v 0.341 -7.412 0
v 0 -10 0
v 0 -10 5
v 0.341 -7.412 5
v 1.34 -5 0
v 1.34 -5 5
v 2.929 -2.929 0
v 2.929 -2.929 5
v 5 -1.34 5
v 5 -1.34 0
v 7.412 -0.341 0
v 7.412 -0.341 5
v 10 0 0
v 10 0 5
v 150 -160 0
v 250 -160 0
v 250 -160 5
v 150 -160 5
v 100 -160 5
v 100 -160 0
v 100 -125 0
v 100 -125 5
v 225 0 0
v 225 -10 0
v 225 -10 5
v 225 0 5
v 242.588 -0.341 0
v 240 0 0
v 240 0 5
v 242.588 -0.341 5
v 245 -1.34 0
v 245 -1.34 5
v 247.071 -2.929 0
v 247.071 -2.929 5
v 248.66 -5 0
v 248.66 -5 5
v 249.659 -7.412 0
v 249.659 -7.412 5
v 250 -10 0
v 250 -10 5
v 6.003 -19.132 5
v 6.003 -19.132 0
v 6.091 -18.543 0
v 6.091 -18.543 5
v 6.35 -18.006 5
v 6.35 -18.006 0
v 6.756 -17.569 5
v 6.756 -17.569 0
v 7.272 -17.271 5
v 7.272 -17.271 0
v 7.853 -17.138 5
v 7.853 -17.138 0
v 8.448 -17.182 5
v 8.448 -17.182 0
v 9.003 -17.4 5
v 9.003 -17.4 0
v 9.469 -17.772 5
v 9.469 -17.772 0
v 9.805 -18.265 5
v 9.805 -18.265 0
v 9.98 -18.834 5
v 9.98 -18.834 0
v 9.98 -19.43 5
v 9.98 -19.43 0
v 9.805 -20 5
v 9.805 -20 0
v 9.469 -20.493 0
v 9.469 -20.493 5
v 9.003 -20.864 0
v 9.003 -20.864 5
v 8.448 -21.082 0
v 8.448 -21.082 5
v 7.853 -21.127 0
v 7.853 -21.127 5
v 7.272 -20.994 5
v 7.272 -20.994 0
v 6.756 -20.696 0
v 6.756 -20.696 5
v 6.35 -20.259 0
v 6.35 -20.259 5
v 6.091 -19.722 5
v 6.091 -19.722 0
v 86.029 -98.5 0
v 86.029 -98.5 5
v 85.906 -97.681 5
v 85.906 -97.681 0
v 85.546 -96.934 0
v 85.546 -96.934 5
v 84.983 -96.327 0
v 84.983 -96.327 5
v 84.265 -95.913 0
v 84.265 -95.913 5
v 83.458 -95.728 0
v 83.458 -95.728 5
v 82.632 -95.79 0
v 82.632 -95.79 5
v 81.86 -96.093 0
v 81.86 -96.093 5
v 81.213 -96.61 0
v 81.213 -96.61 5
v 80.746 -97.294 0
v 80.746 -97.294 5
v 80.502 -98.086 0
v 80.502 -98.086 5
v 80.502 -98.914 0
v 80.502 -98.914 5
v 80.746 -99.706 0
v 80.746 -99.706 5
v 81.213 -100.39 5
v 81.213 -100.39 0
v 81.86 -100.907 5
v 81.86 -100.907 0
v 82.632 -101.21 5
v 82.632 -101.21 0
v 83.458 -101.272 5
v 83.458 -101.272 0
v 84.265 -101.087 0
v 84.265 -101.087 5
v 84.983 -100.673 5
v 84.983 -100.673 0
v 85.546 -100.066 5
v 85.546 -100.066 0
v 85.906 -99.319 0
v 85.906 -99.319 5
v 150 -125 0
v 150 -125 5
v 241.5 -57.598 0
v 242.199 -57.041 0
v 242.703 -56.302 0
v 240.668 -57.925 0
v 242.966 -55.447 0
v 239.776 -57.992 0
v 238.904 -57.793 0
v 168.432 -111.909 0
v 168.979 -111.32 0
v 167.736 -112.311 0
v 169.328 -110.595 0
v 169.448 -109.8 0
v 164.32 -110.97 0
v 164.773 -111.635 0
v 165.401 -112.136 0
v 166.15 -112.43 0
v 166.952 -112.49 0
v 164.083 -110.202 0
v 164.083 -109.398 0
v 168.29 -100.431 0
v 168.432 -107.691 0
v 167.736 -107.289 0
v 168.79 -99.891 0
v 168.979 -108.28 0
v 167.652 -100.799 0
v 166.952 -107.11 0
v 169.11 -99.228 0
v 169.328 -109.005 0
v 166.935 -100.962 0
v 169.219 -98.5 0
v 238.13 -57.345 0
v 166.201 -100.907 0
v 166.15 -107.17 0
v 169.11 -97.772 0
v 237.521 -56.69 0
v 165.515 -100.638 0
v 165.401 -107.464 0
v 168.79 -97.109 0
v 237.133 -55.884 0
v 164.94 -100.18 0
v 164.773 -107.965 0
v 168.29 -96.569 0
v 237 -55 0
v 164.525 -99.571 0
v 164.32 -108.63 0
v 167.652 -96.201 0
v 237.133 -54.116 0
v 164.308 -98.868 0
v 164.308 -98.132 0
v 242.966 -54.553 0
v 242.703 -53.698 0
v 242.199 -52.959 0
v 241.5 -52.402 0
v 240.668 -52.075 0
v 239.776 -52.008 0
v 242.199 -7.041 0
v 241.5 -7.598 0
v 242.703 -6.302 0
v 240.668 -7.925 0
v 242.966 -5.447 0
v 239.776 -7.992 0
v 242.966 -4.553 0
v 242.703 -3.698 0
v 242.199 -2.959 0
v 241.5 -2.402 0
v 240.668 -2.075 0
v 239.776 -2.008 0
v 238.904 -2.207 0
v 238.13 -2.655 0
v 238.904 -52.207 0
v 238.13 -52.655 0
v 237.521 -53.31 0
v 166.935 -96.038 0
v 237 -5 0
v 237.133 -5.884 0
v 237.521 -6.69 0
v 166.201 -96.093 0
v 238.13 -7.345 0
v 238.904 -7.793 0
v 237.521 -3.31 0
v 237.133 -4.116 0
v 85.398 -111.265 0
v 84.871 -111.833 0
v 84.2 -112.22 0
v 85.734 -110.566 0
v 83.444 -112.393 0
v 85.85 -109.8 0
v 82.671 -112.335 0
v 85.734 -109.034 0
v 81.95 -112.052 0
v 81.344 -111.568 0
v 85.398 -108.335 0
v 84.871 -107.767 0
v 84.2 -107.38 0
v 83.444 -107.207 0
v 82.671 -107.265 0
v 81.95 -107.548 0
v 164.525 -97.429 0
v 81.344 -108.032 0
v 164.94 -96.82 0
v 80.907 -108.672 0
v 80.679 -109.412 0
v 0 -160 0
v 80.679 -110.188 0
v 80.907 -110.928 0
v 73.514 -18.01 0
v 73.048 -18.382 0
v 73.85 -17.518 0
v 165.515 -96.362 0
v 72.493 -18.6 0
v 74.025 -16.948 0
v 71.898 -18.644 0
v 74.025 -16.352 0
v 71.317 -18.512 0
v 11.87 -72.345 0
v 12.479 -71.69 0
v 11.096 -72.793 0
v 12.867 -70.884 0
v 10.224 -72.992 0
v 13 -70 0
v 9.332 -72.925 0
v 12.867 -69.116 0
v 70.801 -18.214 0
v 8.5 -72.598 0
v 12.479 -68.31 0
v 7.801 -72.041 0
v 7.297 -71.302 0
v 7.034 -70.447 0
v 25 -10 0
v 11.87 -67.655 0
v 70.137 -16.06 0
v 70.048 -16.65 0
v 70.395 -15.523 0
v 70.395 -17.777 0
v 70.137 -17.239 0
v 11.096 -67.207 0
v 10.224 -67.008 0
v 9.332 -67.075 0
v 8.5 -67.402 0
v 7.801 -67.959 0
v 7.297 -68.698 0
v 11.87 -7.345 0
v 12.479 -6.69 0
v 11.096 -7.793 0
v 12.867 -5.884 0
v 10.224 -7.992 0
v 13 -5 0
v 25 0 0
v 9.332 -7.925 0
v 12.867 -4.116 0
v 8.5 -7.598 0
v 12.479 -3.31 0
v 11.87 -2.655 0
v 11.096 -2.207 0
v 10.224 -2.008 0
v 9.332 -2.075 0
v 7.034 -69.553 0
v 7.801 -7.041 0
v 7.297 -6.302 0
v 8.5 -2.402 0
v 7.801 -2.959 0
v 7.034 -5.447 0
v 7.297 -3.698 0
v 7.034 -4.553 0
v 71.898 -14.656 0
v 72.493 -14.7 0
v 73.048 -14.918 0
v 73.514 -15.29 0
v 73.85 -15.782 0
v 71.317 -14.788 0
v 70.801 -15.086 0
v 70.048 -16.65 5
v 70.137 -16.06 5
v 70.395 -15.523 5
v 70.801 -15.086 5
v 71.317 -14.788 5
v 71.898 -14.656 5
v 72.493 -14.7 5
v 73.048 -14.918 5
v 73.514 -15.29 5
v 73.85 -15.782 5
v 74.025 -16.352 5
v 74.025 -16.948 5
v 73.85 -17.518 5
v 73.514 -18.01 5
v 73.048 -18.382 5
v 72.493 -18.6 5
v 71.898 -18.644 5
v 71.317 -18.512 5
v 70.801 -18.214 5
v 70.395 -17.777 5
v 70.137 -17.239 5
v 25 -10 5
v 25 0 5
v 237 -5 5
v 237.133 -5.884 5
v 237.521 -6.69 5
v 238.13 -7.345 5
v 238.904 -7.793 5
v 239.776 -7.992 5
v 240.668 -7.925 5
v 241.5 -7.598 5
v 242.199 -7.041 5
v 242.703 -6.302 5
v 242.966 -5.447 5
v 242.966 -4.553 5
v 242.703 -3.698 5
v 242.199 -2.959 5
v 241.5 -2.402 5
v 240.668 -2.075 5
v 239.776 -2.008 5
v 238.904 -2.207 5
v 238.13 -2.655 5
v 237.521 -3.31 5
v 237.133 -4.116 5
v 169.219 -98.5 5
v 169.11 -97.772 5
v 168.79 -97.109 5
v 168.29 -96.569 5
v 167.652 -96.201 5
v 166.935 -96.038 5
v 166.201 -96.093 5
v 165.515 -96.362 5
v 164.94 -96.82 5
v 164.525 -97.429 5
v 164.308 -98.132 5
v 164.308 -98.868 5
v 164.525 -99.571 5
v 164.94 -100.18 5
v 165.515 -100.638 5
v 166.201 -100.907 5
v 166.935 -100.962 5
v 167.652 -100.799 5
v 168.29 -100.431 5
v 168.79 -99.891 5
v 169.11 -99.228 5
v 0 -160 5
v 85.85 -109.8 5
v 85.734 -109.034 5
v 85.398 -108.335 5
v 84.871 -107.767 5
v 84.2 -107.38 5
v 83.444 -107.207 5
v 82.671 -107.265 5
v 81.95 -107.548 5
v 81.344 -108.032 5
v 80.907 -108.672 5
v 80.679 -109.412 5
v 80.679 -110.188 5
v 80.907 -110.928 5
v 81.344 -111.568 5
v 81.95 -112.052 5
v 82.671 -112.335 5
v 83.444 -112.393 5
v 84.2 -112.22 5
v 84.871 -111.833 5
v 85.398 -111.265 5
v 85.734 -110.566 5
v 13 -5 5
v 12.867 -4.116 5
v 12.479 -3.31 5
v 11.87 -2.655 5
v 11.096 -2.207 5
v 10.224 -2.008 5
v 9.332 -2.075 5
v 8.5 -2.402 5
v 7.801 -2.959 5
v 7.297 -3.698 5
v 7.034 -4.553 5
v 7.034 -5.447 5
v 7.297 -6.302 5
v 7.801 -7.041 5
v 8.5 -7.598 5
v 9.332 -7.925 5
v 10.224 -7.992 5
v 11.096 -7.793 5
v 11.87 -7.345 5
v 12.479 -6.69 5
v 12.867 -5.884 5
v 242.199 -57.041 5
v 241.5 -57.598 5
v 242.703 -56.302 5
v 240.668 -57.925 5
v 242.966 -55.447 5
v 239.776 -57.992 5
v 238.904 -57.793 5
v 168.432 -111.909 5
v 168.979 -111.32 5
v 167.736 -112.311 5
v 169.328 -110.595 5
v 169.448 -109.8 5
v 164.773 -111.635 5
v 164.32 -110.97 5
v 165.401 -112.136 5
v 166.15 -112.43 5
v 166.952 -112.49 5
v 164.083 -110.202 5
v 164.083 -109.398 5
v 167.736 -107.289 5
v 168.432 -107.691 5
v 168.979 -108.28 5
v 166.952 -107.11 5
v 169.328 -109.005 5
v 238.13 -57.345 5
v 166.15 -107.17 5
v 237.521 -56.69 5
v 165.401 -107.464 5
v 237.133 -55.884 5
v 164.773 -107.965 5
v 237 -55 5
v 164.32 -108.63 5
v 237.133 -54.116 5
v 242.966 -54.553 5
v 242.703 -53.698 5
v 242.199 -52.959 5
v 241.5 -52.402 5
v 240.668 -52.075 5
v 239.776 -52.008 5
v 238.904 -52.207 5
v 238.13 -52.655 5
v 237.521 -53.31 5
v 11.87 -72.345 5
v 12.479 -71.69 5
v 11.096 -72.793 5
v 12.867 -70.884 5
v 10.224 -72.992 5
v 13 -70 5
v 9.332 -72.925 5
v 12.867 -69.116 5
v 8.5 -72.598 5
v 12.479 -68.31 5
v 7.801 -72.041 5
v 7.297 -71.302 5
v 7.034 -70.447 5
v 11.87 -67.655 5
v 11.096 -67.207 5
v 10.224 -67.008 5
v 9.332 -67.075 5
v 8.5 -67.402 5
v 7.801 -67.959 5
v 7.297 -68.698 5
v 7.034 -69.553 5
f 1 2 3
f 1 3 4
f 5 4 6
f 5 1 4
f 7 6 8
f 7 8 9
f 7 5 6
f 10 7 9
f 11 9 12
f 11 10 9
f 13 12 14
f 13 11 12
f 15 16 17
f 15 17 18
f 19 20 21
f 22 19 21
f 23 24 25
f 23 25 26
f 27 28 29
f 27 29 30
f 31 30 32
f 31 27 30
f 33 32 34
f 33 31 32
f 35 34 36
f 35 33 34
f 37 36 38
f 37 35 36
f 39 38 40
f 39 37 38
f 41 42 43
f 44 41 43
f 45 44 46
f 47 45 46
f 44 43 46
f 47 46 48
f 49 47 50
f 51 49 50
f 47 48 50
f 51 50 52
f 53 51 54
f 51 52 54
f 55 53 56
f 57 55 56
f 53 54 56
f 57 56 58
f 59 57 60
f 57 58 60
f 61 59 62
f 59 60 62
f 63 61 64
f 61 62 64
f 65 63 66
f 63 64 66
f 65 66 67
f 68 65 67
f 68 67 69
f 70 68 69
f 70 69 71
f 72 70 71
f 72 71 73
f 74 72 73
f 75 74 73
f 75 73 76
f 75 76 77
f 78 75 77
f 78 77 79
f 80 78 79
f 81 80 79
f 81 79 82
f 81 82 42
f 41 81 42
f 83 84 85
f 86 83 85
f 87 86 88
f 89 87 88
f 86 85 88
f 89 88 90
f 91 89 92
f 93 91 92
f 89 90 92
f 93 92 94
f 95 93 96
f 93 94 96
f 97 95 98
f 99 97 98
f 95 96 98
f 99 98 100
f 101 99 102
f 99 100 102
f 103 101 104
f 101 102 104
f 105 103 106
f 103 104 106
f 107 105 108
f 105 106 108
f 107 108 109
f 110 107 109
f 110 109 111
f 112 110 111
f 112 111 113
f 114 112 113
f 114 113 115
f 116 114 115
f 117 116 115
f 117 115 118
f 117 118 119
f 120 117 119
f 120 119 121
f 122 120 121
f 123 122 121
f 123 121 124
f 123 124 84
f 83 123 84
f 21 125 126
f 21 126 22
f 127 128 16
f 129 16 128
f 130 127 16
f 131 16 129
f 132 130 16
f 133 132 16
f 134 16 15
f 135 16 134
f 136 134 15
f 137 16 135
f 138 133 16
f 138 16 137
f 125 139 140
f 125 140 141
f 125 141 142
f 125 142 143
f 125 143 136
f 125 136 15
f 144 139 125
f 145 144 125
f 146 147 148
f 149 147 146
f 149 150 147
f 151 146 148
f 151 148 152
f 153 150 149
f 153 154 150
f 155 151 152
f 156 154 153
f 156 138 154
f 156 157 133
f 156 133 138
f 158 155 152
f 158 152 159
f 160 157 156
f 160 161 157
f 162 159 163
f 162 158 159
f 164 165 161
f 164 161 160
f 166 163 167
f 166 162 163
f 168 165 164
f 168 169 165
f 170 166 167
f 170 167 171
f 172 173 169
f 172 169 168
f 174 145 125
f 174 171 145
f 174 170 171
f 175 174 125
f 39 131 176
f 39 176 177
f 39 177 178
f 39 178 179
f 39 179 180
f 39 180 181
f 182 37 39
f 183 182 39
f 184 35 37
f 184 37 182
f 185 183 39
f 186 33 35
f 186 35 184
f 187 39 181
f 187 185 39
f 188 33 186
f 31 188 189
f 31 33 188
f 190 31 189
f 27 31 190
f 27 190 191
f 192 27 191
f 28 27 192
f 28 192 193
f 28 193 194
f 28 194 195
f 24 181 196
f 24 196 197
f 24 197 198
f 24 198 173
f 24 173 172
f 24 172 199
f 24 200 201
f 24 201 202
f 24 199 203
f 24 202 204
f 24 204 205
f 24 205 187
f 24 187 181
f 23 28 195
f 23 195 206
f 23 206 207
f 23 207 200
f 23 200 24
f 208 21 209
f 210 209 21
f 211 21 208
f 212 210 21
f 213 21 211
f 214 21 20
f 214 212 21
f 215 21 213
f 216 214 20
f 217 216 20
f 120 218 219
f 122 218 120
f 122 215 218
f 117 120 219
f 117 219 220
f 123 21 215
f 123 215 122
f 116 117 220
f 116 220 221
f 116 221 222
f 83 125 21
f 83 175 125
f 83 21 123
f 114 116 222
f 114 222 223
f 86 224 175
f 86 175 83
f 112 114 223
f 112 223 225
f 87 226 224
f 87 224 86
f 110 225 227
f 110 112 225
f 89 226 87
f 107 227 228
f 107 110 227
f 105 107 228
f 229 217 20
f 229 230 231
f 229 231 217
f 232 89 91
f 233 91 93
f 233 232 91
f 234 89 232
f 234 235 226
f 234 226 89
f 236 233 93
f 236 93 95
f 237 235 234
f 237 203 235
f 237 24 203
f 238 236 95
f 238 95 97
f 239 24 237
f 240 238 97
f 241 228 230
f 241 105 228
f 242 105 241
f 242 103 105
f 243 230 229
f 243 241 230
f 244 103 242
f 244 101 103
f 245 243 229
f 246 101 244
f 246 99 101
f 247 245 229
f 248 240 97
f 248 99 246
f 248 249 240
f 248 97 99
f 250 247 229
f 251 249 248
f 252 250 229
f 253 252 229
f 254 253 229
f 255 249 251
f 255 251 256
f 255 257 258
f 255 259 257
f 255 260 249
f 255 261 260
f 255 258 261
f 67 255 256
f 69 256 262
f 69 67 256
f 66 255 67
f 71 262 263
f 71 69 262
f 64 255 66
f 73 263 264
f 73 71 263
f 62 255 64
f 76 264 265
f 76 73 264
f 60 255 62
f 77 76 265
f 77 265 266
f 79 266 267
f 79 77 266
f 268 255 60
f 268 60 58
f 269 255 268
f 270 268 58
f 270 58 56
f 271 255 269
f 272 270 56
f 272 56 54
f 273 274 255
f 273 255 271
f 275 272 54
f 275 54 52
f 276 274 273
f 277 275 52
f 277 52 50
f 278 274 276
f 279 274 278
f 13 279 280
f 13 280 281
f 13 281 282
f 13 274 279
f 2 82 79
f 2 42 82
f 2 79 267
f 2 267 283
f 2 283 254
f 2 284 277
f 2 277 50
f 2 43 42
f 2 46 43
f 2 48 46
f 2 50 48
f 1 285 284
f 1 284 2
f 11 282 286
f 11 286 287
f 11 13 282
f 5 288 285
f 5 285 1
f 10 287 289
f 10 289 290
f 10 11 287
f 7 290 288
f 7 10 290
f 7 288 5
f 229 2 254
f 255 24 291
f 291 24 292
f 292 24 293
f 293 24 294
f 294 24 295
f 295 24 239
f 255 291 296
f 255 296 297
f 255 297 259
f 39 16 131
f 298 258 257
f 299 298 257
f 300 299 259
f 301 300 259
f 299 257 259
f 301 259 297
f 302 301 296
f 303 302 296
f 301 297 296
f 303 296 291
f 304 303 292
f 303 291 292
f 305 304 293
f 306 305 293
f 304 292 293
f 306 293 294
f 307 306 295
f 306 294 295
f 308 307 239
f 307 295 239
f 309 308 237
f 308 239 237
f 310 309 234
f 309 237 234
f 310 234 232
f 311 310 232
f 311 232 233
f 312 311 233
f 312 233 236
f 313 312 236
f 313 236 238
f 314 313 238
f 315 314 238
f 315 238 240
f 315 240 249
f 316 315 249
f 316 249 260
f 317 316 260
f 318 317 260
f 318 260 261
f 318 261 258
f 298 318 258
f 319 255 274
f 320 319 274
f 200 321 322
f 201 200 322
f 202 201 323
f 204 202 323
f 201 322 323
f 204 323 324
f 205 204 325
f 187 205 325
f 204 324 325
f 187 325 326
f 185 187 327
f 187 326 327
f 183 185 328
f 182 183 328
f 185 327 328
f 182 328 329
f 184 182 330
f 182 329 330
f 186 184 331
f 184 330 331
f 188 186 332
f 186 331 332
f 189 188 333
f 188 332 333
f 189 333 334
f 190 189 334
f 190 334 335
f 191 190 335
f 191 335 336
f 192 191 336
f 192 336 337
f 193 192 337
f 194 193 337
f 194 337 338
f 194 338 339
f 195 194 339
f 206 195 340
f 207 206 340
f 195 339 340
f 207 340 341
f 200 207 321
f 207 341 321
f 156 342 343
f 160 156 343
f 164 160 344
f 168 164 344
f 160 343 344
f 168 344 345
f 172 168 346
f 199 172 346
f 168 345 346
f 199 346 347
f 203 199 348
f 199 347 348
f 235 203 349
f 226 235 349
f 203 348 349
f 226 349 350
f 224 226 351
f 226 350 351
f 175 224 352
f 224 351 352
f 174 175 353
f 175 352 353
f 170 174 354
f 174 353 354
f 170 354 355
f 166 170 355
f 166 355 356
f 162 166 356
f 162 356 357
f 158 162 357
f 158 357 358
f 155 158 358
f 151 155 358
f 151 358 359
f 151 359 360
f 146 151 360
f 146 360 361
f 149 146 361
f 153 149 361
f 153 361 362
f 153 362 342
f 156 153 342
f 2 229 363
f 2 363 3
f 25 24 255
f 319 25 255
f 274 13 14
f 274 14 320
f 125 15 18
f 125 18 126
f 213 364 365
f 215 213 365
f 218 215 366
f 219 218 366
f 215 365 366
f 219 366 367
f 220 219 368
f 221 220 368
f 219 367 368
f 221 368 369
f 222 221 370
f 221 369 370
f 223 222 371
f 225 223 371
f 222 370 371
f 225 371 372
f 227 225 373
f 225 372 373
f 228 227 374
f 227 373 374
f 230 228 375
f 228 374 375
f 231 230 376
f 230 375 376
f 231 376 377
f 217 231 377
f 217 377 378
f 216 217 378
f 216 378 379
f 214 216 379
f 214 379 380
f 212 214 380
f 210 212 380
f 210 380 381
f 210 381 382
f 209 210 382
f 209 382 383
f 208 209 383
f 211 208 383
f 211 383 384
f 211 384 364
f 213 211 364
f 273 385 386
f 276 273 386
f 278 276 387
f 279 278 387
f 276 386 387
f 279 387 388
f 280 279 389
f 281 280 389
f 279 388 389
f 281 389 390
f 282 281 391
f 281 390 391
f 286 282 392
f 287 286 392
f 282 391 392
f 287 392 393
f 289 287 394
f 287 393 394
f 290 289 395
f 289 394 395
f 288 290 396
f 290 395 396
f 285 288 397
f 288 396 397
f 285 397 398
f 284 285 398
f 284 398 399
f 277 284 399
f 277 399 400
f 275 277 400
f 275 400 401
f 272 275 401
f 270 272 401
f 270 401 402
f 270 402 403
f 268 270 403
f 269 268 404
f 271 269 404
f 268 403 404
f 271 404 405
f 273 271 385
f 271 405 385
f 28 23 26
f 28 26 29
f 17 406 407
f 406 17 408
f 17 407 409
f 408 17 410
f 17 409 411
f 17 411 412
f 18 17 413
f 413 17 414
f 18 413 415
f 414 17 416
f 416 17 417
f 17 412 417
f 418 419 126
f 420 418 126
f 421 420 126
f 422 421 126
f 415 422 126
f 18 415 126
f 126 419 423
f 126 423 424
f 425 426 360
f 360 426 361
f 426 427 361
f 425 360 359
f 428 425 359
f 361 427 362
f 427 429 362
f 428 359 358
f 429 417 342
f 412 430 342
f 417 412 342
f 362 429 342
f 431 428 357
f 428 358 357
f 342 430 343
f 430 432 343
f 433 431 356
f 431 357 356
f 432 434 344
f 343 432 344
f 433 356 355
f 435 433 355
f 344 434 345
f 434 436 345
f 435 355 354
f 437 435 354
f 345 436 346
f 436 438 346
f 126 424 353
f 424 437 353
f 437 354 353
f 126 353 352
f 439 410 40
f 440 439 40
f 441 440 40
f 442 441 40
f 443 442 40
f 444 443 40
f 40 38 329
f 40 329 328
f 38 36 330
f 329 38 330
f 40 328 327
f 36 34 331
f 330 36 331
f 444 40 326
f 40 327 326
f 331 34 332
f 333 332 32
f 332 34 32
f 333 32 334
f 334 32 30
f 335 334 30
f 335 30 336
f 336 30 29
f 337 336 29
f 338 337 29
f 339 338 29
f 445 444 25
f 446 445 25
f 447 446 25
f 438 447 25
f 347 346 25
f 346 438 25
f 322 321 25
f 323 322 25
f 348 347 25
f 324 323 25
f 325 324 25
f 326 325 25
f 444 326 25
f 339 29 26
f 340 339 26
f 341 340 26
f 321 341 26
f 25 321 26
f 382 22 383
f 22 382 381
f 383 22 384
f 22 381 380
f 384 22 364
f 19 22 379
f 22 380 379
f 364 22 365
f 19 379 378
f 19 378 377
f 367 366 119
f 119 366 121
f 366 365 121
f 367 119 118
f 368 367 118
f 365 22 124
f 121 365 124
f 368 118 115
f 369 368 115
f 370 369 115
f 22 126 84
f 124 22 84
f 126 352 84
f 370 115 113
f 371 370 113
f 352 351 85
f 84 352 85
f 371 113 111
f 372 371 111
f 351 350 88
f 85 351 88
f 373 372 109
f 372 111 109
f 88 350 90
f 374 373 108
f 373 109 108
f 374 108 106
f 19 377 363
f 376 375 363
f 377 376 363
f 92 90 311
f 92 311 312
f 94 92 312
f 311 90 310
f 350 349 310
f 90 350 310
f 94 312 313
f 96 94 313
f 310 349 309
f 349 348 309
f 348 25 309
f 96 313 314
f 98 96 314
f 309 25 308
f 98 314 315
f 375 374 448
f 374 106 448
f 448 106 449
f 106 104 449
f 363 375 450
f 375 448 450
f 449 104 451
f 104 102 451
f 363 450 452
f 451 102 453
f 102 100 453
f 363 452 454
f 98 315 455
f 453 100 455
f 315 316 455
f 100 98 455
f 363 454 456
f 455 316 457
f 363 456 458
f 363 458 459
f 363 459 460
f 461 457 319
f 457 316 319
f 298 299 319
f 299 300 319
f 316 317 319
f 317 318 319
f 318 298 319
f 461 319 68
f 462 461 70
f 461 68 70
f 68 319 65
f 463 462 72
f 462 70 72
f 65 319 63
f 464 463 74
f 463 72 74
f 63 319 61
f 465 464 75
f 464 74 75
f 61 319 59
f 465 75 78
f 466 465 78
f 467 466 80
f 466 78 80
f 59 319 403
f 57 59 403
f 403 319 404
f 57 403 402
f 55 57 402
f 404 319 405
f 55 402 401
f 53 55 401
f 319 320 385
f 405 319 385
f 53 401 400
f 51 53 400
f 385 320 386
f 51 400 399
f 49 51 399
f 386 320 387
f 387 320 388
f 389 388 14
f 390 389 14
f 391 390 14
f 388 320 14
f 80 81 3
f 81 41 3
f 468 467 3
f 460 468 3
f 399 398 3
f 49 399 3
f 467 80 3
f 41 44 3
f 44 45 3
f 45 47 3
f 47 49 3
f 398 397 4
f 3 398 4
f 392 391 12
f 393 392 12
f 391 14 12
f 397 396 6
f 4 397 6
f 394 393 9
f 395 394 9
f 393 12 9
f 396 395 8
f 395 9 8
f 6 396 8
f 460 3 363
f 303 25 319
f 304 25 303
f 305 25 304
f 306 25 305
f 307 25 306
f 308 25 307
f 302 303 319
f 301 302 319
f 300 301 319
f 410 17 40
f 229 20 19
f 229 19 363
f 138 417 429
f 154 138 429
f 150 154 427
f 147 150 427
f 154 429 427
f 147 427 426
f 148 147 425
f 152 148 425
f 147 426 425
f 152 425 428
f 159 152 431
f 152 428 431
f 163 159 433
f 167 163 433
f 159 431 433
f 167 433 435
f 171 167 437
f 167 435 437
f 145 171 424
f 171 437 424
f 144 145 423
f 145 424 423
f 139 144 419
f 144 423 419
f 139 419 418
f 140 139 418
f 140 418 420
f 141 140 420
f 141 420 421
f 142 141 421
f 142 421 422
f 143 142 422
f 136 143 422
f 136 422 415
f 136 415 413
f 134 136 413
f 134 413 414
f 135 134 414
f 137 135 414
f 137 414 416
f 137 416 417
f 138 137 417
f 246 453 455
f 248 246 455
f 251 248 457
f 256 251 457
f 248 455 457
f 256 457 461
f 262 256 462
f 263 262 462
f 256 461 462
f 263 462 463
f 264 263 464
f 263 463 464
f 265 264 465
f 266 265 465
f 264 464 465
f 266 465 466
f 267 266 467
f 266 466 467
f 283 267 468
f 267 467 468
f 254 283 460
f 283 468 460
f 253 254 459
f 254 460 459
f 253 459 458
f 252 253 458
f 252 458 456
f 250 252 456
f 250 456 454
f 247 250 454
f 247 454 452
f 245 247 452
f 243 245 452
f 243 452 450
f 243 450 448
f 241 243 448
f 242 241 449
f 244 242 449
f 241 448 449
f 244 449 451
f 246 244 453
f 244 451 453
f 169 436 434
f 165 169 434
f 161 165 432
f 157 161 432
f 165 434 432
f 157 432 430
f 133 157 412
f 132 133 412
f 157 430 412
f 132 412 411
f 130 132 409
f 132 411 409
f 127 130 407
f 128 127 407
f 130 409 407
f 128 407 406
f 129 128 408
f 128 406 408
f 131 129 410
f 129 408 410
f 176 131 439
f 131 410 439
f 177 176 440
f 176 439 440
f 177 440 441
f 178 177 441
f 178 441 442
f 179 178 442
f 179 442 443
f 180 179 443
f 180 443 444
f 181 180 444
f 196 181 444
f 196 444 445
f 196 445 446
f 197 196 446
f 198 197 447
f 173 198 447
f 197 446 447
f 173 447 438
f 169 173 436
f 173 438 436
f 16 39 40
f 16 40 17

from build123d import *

# Parameters (mm, degrees)
BOSS_EXTRU_1_DEPTH      = 5
ESQUISSE2_R             = 3
ENL_V_MAT_EXTRU_1_DEPTH = 5
ESQUISSE3_W             = 200
ESQUISSE3_H             = 10
ENL_V_MAT_EXTRU_2_DEPTH = 10
ESQUISSE4_R             = 2
ENL_V_MAT_EXTRU_3_DEPTH = 297.858552176
ESQUISSE5_W             = 50
ESQUISSE5_H             = 35
ENL_V_MAT_EXTRU_4_DEPTH = 297.858552176
ESQUISSE6_R             = 2.6
ESQUISSE6_R_2           = 2.779338986
ESQUISSE6_R_3           = 2.697585155
ESQUISSE6_R_4           = 2.469314184
ENL_V_MAT_EXTRU_5_DEPTH = 297.858552176


with BuildPart() as part:
    # Esquisse1 → Boss.-Extru.1 (new body)
    with BuildSketch(Plane.XY):
        with BuildLine():
            Line((10, 0), (240, 0))
            ThreePointArc((240, 0), (247.071067812, -2.928932188), (250, -10))
            Line((250, -10), (250, -160))
            Line((250, -160), (0, -160))
            Line((0, -160), (0, -10))
            ThreePointArc((0, -10), (2.928932188, -2.928932188), (10, 0))
        make_face()
    extrude(amount=BOSS_EXTRU_1_DEPTH)

    # Esquisse2 → Enlèv. mat.-Extru.1 (cut)
    with BuildSketch(Plane.XY.offset(5)):
        with Locations((10, -5)):
            Circle(ESQUISSE2_R)
        with Locations(Location((240, -55, 0), (0, 0, 180))):
            Circle(ESQUISSE2_R)
        with Locations(Location((240, -5, 0), (0, 0, 180))):
            Circle(ESQUISSE2_R)
        with Locations((10, -70)):
            Circle(ESQUISSE2_R)
    extrude(amount=-ENL_V_MAT_EXTRU_1_DEPTH, mode=Mode.SUBTRACT)

    # Esquisse3 → Enlèv. mat.-Extru.2 (cut)
    with BuildSketch(Plane(origin=(0, 0, 0), x_dir=(-1, 0, 0), z_dir=(0, 0, -1))):
        with Locations((-125, -5)):
            Rectangle(ESQUISSE3_W, ESQUISSE3_H)
    extrude(amount=-ENL_V_MAT_EXTRU_2_DEPTH, mode=Mode.SUBTRACT)

    # Esquisse4 → Enlèv. mat.-Extru.3 (cut, through all)
    with BuildSketch(Plane(origin=(0, 0, 0), x_dir=(-1, 0, 0), z_dir=(0, 0, -1))):
        with Locations((-8.002599179, -19.132336536)):
            Circle(ESQUISSE4_R)
        with Locations((-72.047815248, -16.649941006)):
            Circle(ESQUISSE4_R)
    extrude(amount=-ENL_V_MAT_EXTRU_3_DEPTH, mode=Mode.SUBTRACT)

    # Esquisse5 → Enlèv. mat.-Extru.4 (cut, through all)
    with BuildSketch(Plane(origin=(0, 0, 0), x_dir=(-1, 0, 0), z_dir=(0, 0, -1))):
        with Locations((-125, -142.5)):
            Rectangle(ESQUISSE5_W, ESQUISSE5_H)
    extrude(amount=-ENL_V_MAT_EXTRU_4_DEPTH, mode=Mode.SUBTRACT)

    # Esquisse6 → Enlèv. mat.-Extru.5 (cut, through all)
    with BuildSketch(Plane.XY.offset(5)):
        with Locations((83.25, -109.8)):
            Circle(ESQUISSE6_R)
        with Locations((83.25, -98.5)):
            Circle(ESQUISSE6_R_2)
        with Locations((166.75, -109.8)):
            Circle(ESQUISSE6_R_3)
        with Locations((166.75, -98.5)):
            Circle(ESQUISSE6_R_4)
    extrude(amount=-ENL_V_MAT_EXTRU_5_DEPTH, mode=Mode.SUBTRACT)


solid = part.part
